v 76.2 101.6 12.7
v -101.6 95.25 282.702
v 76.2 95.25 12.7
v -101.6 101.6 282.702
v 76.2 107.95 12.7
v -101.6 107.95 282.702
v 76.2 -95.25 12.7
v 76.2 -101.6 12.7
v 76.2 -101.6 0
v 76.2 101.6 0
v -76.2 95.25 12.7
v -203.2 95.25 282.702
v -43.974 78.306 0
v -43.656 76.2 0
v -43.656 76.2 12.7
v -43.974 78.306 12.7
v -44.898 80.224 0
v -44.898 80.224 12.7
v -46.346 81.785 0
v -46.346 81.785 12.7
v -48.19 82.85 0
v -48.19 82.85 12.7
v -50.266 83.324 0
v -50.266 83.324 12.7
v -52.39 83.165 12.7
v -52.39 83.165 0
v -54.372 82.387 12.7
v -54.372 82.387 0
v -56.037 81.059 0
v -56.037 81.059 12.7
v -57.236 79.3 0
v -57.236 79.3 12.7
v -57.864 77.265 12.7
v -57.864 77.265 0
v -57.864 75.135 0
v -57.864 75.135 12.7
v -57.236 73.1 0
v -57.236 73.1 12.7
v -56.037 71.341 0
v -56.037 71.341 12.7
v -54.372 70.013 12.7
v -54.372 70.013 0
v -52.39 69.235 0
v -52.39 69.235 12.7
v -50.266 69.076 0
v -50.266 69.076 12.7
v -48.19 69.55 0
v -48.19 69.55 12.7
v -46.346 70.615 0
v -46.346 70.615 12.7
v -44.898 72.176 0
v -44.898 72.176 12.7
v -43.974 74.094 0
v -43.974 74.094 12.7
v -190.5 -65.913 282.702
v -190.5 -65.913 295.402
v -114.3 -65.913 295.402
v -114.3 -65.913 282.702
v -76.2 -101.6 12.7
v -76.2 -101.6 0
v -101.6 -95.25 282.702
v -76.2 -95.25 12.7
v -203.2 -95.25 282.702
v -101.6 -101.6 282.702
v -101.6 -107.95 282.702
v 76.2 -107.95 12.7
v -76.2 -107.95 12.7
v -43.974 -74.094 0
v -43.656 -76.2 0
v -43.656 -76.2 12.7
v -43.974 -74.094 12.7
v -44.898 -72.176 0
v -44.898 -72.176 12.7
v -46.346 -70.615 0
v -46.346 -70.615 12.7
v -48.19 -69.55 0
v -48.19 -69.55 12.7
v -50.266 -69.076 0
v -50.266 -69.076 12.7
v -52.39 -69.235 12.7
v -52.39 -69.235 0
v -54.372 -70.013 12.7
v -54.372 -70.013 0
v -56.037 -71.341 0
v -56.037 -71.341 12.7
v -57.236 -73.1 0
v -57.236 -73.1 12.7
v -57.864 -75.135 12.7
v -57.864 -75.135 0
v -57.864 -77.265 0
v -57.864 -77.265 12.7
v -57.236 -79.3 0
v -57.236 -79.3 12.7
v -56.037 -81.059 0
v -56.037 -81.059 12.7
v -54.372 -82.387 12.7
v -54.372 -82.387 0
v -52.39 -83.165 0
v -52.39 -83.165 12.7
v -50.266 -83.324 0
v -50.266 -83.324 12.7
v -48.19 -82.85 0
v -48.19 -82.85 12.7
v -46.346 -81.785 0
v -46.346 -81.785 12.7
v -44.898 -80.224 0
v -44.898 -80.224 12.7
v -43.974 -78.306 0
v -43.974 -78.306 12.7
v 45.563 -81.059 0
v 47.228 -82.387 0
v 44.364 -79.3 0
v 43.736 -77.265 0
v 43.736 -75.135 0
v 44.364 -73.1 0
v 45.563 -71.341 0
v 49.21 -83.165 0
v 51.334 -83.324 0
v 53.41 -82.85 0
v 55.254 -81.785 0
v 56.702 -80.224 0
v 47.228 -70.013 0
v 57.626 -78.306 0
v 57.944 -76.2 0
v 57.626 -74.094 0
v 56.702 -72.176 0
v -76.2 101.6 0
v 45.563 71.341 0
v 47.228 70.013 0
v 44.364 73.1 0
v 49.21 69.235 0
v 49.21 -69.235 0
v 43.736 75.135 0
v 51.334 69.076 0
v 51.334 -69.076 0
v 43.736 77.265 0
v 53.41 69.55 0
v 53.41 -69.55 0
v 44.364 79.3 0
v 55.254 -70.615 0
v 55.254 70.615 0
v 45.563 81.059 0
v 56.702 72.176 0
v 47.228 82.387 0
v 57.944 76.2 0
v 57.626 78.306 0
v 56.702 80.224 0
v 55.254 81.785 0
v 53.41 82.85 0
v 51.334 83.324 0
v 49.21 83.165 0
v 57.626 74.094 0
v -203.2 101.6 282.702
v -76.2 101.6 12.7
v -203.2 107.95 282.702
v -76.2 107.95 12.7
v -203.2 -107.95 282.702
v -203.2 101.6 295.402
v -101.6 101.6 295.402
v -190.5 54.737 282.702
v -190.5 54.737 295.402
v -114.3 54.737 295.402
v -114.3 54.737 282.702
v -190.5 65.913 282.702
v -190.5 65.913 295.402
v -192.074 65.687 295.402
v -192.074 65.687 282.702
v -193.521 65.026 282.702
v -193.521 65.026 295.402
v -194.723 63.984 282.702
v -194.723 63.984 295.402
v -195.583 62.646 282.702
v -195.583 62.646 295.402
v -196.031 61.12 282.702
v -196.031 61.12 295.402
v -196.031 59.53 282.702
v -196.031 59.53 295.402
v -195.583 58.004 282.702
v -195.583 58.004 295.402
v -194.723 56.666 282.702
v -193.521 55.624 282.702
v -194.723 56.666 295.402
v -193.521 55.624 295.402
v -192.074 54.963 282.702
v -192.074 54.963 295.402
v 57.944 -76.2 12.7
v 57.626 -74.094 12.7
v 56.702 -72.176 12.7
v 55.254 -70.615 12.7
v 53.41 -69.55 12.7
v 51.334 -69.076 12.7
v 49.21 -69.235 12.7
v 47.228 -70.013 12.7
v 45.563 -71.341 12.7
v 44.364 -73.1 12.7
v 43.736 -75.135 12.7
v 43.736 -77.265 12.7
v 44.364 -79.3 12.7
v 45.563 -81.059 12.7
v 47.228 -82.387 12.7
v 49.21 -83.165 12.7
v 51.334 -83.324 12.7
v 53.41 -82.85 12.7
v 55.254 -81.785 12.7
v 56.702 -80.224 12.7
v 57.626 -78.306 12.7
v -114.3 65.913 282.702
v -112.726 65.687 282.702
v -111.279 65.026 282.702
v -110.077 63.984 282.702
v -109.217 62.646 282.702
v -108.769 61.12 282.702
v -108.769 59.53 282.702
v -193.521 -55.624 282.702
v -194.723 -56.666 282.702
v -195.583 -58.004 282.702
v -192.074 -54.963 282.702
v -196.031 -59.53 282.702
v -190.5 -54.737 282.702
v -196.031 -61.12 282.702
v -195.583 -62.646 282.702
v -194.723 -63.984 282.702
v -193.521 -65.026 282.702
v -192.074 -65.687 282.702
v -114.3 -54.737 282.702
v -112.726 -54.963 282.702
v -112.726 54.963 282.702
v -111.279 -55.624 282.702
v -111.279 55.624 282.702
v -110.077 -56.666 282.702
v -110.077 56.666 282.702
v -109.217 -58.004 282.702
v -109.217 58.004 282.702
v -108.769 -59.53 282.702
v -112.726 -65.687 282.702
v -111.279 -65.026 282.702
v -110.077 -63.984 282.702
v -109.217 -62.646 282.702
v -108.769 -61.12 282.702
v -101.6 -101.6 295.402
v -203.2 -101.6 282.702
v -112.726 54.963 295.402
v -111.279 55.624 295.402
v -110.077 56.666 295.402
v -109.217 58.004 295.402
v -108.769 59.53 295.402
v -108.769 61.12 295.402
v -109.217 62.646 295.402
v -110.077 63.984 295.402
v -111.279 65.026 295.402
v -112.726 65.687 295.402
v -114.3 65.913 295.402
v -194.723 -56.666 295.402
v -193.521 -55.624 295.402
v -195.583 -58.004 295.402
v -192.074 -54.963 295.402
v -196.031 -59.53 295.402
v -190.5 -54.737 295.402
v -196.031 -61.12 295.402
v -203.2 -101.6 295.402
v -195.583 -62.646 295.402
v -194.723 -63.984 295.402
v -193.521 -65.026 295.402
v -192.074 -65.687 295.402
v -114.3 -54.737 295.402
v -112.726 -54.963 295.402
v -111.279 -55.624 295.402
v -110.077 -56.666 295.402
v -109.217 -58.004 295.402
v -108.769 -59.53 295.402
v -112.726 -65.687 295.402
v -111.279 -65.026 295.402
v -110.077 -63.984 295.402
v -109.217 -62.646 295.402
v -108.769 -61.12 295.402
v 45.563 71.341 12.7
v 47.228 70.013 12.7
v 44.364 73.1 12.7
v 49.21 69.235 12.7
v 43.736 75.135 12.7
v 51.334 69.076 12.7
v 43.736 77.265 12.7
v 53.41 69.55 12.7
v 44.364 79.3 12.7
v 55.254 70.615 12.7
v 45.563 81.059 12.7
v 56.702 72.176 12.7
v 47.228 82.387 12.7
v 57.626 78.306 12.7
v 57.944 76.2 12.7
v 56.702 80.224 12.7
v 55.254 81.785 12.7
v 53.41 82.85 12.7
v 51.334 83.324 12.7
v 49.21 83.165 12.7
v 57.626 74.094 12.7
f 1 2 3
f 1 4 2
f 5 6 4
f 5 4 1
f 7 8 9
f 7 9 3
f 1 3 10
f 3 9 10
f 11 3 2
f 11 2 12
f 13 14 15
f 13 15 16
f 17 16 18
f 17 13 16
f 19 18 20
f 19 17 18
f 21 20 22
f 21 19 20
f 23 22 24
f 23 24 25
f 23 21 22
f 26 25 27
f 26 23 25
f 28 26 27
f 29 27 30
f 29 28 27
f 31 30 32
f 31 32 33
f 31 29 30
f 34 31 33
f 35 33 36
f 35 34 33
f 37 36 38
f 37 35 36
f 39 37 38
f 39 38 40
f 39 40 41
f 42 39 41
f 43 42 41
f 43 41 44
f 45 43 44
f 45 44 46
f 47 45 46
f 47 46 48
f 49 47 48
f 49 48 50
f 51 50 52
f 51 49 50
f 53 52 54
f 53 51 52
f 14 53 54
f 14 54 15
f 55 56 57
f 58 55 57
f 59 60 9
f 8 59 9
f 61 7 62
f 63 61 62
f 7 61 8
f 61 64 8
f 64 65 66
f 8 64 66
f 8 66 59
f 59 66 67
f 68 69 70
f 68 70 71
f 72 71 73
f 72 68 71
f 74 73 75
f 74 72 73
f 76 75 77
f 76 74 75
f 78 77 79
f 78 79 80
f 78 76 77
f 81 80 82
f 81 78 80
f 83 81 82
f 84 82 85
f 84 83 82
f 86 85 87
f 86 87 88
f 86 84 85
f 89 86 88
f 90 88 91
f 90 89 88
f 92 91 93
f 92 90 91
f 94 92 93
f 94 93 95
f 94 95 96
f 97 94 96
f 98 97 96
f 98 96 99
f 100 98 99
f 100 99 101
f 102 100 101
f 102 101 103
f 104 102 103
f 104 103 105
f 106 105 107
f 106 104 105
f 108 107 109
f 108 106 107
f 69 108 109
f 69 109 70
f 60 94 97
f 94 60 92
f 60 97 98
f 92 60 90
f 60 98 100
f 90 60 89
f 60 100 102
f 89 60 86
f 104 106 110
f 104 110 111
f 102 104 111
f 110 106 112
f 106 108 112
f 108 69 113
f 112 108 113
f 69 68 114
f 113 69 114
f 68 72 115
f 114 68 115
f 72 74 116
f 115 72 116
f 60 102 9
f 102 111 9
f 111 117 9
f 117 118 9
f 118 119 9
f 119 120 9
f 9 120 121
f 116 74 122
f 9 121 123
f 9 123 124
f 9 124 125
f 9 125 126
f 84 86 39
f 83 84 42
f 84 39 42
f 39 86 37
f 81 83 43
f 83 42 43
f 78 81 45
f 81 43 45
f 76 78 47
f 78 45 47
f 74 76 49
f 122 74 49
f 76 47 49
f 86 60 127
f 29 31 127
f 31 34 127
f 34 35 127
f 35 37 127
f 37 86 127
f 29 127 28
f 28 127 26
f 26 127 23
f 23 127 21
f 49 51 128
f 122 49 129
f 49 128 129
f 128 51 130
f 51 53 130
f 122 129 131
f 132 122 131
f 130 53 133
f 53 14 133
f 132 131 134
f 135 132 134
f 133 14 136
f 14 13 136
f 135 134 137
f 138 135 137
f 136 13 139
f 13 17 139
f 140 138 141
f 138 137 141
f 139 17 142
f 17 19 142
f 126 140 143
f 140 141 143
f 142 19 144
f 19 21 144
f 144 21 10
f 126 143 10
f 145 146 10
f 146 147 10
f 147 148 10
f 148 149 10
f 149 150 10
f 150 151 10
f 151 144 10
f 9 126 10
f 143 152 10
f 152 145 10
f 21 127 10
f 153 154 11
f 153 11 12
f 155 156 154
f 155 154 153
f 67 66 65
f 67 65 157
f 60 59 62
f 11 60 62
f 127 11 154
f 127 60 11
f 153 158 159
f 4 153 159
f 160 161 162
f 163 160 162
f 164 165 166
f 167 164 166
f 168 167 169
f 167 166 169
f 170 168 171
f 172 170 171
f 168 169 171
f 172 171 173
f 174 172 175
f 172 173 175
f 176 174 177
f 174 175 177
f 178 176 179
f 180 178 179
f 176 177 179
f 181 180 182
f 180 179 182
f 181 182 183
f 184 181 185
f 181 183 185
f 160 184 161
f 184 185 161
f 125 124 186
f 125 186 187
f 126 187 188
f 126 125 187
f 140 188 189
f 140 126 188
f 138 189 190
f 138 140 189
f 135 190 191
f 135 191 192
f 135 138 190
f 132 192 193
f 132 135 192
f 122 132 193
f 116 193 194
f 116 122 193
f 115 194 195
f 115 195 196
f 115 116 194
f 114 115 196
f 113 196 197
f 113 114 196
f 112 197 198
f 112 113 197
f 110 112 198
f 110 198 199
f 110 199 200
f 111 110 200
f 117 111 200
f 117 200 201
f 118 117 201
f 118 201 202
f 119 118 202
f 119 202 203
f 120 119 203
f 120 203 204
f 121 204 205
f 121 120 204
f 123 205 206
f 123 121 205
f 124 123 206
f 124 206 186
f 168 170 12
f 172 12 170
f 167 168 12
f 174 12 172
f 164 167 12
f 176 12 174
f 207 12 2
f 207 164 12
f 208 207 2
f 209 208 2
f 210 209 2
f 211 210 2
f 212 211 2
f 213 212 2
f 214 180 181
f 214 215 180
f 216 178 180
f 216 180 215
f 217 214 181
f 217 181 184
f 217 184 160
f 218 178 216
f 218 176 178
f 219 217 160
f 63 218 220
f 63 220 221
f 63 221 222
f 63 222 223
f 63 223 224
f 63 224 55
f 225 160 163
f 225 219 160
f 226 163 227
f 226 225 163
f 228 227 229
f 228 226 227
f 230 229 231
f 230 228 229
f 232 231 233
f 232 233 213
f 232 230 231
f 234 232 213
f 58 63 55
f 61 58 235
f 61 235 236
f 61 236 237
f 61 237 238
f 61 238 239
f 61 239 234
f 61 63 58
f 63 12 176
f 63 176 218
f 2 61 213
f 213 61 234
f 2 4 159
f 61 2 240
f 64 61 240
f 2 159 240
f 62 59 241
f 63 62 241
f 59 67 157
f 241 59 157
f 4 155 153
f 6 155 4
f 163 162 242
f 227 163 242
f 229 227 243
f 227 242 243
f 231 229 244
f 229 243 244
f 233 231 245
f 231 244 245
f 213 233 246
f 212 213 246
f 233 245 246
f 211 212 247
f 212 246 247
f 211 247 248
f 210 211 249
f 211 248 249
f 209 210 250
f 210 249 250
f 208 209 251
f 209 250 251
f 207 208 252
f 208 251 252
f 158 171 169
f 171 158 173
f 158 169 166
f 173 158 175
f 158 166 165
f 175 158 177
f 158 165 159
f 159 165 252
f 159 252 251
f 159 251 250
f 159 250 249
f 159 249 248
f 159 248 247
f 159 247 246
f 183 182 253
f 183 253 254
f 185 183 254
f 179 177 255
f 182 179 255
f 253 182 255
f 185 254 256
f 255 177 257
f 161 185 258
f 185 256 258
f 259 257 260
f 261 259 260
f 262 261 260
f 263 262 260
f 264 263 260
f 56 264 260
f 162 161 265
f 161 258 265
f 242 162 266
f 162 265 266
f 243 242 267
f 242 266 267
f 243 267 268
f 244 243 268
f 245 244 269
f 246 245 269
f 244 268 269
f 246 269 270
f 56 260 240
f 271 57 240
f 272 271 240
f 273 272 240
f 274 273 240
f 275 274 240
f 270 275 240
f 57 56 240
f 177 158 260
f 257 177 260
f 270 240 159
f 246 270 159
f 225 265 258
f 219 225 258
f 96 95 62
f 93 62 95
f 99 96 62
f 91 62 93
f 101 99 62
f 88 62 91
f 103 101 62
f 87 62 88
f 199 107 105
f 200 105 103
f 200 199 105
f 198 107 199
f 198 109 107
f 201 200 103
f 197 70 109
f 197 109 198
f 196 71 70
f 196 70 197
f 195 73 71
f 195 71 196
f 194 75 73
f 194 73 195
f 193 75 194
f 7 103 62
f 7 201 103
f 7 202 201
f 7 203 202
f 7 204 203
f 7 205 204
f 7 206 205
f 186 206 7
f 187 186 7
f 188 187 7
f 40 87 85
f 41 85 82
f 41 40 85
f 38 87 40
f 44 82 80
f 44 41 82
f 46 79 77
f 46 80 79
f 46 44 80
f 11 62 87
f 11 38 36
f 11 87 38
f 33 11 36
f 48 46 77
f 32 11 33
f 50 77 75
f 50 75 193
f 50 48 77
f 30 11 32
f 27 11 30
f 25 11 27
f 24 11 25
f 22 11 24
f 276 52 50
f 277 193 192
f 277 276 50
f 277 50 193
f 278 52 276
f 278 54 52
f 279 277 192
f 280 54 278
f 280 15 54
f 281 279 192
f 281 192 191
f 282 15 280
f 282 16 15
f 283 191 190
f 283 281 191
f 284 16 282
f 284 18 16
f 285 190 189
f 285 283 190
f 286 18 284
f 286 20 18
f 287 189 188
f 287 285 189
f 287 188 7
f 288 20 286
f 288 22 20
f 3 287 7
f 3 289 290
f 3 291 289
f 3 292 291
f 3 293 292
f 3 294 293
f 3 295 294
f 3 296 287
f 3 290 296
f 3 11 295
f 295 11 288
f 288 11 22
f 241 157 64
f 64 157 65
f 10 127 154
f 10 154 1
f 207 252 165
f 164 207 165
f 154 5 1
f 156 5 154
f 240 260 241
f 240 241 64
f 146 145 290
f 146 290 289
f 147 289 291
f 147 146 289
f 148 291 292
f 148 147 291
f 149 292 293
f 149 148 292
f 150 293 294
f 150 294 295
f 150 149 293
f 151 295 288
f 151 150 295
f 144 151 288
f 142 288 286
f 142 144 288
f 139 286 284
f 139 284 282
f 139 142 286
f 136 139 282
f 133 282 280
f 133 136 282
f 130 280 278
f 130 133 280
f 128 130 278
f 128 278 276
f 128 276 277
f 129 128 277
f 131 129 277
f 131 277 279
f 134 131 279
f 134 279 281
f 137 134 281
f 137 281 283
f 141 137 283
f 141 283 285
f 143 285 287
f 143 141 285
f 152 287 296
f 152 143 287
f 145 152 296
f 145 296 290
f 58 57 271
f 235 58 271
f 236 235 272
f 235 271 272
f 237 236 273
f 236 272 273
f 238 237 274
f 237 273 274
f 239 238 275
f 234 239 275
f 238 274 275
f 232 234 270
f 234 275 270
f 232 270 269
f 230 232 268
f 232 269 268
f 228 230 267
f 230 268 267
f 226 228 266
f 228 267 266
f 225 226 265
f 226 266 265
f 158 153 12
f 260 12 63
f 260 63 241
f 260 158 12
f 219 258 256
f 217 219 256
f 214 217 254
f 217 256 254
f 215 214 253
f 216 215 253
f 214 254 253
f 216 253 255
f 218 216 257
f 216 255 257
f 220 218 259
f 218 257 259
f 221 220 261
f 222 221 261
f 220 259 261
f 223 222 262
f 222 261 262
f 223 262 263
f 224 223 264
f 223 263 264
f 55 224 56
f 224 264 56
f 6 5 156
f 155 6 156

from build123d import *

# Parameters (mm, degrees)
F0_W     = 152.4
F0_H     = 203.2
F0_R     = 7.14375
F1_DEPTH = 12.7
F3_W     = 101.6
F3_H     = 203.2
F4_DEPTH = 12.7
F6_DEPTH = 6.35


with BuildPart() as f1:
    # F0 (on Top) → F1 (new body)
    with BuildSketch(Plane.XY):
        Rectangle(F0_W, F0_H)
        with Locations((-50.8, -76.2)):
            Circle(F0_R, mode=Mode.SUBTRACT)
        with Locations((50.8, -76.2)):
            Circle(F0_R, mode=Mode.SUBTRACT)
        with Locations((-50.8, 76.2)):
            Circle(F0_R, mode=Mode.SUBTRACT)
        with Locations((50.8, 76.2)):
            Circle(F0_R, mode=Mode.SUBTRACT)
    extrude(amount=F1_DEPTH)



with BuildPart() as f4:
    # F3 (on offset) → F4 (new body)
    with BuildSketch(Plane(origin=(0, 0, 295.402), x_dir=(1, 0, 0), z_dir=(0, 0, -1))):
        with Locations((-152.4, 0)):
            Rectangle(F3_W, F3_H)
        with BuildLine():
            ThreePointArc((-114.3, -54.737), (-108.712, -60.325), (-114.3, -65.913))
            Line((-114.3, -65.913), (-190.5, -65.913))
            ThreePointArc((-190.5, -65.913), (-196.088, -60.325), (-190.5, -54.737))
            Line((-190.5, -54.737), (-114.3, -54.737))
        make_face(mode=Mode.SUBTRACT)
        with BuildLine():
            Line((-114.3, 54.737), (-190.5, 54.737))
            ThreePointArc((-190.5, 54.737), (-196.088, 60.325), (-190.5, 65.913))
            Line((-190.5, 65.913), (-114.3, 65.913))
            ThreePointArc((-114.3, 65.913), (-108.712, 60.325), (-114.3, 54.737))
        make_face(mode=Mode.SUBTRACT)
    extrude(amount=F4_DEPTH)


with BuildPart() as f1_1:
    add(f1.part)

    add(f4.part)  # F6 merges F4
    # F5 (on face) → F6 (join, symmetric)
    with BuildSketch(Plane(origin=(0, 101.6, 0), x_dir=(-1, 0, 0), z_dir=(0, 1, 0))):
        Polygon((-76.2, 12.7), (76.2, 12.7), (203.2, 282.702), (101.6, 282.702), align=None)
    extrude(amount=F6_DEPTH, both=True)

    # F7: F1 across plane


with BuildPart() as f1_2:
    add(f1_1.part)
    add(f1_1.part.mirror(Plane.XZ))


solid = f1_2.part
